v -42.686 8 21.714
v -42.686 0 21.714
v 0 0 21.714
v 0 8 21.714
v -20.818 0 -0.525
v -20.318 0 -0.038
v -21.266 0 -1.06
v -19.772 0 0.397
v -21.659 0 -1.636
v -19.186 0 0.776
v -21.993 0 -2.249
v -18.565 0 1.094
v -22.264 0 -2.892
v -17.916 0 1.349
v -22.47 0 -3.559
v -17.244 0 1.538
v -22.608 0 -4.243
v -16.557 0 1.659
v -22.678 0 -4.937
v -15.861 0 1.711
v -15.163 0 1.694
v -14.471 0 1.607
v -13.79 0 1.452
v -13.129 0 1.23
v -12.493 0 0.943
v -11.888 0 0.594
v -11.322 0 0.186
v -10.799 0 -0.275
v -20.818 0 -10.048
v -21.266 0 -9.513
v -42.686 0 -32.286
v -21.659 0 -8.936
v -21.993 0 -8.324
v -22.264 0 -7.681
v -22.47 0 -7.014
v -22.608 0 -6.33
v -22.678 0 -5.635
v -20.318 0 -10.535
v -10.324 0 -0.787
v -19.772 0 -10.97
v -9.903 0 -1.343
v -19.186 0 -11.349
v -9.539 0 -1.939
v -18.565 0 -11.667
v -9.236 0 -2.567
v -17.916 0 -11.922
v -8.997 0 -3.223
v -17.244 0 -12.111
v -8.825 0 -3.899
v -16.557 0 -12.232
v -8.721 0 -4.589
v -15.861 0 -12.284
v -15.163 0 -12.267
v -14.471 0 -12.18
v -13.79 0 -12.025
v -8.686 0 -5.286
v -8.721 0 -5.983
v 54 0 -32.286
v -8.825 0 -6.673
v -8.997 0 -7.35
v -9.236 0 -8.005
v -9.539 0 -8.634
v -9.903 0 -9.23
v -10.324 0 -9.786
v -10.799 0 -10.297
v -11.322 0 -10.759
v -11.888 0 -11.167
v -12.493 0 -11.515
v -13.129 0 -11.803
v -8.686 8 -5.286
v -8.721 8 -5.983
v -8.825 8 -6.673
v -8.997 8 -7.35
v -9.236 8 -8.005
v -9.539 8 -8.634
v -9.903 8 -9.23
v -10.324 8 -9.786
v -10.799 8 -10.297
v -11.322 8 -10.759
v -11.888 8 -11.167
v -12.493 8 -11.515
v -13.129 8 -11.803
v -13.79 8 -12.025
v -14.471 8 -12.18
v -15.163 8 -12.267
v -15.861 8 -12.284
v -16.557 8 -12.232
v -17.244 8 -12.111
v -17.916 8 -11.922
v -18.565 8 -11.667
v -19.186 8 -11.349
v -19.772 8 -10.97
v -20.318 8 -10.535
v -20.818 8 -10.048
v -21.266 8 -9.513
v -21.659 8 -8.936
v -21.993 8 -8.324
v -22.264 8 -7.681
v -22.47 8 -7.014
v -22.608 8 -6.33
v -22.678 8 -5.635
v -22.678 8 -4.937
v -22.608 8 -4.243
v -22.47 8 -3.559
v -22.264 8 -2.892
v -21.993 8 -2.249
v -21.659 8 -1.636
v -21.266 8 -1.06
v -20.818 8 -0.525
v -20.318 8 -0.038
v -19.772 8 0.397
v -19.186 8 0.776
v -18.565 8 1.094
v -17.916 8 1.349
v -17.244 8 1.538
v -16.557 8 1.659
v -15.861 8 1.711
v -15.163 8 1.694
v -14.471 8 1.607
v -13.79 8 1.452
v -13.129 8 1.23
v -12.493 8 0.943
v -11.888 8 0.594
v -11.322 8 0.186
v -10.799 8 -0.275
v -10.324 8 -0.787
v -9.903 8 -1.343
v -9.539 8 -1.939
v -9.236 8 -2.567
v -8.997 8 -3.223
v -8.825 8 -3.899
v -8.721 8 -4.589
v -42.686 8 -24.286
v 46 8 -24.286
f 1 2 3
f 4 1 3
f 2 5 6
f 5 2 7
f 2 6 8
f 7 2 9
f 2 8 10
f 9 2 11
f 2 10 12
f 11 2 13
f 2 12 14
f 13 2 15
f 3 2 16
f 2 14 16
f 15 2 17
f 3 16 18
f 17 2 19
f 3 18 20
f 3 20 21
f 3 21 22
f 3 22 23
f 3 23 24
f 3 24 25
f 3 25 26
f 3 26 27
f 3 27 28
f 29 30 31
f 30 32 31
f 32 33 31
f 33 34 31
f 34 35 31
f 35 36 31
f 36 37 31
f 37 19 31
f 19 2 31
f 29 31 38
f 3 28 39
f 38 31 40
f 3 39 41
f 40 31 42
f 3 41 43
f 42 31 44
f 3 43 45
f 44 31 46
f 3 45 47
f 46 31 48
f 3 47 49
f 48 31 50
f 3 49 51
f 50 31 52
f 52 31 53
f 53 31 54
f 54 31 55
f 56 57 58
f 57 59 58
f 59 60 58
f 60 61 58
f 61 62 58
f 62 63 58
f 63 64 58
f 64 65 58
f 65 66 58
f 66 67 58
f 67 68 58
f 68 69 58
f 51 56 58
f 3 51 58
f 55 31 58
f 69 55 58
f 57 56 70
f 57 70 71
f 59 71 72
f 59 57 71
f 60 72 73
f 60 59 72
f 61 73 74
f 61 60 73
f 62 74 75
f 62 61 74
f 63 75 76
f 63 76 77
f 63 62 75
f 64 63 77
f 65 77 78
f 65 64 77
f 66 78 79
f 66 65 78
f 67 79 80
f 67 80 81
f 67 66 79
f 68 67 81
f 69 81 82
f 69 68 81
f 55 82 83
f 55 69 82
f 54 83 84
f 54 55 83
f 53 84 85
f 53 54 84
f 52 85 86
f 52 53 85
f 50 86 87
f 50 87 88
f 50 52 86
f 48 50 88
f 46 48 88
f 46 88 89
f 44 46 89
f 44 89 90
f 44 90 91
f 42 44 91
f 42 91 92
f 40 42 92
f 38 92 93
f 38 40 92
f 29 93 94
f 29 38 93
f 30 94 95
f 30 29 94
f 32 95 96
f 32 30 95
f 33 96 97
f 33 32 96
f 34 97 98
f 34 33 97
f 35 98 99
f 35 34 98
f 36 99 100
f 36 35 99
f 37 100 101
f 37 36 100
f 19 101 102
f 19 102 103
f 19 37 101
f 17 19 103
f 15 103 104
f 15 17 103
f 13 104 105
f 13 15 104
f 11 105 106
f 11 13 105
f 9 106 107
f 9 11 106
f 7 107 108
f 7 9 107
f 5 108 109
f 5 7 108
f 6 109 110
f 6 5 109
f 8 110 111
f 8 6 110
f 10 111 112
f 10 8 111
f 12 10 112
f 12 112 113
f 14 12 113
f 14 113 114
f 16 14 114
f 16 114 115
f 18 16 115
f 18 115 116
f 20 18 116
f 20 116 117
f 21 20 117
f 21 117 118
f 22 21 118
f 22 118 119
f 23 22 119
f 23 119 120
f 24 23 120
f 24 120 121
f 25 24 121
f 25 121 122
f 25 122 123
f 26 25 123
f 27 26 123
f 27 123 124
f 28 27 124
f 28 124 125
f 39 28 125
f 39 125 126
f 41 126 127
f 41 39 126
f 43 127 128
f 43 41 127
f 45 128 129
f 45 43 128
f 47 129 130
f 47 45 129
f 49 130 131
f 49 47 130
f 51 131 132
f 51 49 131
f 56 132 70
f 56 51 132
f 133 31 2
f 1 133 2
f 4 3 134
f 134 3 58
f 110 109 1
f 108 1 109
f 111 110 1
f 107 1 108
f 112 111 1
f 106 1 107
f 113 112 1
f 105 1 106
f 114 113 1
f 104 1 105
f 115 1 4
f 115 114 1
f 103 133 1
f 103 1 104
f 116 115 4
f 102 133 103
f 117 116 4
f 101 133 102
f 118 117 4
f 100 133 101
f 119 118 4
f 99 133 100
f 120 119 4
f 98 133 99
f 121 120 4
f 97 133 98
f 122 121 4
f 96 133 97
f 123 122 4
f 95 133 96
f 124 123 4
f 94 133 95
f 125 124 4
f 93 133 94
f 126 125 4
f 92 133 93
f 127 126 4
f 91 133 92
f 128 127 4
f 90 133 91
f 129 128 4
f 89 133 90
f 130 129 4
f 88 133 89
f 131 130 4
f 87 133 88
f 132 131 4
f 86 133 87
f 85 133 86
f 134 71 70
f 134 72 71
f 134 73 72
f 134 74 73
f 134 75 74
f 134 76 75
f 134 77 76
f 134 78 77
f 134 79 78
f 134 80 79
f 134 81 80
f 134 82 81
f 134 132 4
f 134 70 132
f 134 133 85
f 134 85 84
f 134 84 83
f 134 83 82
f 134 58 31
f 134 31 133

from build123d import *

# Parameters (mm, degrees)
SKETCH1_R           = 7
BOSS_EXTRUDE1_DEPTH = 8
CUT_EXTRUDE4_START  = -42.686292
CUT_EXTRUDE4_DEPTH  = 192


with BuildPart() as part:
    # Sketch1 → Boss-Extrude1 (new body)
    with BuildSketch(Plane(origin=(0, 0, 0), x_dir=(1, 0, 0), z_dir=(0, 1, 0))):
        Polygon((0, -21.713615023), (54, 32.286384977), (11.313708499, 32.286384977), (-42.686291501, 32.286384977), (-42.686291501, -21.713615023), align=None)
        with Locations((-15.686291501, 5.286384977)):
            Circle(SKETCH1_R, mode=Mode.SUBTRACT)
    extrude(amount=BOSS_EXTRUDE1_DEPTH)

    # Sketch4 → Cut-Extrude4 (cut)
    with BuildSketch(Plane(origin=(0, 0, 0), x_dir=(0, 0, -1), z_dir=(1, 0, 0)).offset(CUT_EXTRUDE4_START)):
        Polygon((32.286384977, 0), (24.286384977, 8), (32.286384977, 8), align=None)
    extrude(amount=CUT_EXTRUDE4_DEPTH, mode=Mode.SUBTRACT)


solid = part.part
